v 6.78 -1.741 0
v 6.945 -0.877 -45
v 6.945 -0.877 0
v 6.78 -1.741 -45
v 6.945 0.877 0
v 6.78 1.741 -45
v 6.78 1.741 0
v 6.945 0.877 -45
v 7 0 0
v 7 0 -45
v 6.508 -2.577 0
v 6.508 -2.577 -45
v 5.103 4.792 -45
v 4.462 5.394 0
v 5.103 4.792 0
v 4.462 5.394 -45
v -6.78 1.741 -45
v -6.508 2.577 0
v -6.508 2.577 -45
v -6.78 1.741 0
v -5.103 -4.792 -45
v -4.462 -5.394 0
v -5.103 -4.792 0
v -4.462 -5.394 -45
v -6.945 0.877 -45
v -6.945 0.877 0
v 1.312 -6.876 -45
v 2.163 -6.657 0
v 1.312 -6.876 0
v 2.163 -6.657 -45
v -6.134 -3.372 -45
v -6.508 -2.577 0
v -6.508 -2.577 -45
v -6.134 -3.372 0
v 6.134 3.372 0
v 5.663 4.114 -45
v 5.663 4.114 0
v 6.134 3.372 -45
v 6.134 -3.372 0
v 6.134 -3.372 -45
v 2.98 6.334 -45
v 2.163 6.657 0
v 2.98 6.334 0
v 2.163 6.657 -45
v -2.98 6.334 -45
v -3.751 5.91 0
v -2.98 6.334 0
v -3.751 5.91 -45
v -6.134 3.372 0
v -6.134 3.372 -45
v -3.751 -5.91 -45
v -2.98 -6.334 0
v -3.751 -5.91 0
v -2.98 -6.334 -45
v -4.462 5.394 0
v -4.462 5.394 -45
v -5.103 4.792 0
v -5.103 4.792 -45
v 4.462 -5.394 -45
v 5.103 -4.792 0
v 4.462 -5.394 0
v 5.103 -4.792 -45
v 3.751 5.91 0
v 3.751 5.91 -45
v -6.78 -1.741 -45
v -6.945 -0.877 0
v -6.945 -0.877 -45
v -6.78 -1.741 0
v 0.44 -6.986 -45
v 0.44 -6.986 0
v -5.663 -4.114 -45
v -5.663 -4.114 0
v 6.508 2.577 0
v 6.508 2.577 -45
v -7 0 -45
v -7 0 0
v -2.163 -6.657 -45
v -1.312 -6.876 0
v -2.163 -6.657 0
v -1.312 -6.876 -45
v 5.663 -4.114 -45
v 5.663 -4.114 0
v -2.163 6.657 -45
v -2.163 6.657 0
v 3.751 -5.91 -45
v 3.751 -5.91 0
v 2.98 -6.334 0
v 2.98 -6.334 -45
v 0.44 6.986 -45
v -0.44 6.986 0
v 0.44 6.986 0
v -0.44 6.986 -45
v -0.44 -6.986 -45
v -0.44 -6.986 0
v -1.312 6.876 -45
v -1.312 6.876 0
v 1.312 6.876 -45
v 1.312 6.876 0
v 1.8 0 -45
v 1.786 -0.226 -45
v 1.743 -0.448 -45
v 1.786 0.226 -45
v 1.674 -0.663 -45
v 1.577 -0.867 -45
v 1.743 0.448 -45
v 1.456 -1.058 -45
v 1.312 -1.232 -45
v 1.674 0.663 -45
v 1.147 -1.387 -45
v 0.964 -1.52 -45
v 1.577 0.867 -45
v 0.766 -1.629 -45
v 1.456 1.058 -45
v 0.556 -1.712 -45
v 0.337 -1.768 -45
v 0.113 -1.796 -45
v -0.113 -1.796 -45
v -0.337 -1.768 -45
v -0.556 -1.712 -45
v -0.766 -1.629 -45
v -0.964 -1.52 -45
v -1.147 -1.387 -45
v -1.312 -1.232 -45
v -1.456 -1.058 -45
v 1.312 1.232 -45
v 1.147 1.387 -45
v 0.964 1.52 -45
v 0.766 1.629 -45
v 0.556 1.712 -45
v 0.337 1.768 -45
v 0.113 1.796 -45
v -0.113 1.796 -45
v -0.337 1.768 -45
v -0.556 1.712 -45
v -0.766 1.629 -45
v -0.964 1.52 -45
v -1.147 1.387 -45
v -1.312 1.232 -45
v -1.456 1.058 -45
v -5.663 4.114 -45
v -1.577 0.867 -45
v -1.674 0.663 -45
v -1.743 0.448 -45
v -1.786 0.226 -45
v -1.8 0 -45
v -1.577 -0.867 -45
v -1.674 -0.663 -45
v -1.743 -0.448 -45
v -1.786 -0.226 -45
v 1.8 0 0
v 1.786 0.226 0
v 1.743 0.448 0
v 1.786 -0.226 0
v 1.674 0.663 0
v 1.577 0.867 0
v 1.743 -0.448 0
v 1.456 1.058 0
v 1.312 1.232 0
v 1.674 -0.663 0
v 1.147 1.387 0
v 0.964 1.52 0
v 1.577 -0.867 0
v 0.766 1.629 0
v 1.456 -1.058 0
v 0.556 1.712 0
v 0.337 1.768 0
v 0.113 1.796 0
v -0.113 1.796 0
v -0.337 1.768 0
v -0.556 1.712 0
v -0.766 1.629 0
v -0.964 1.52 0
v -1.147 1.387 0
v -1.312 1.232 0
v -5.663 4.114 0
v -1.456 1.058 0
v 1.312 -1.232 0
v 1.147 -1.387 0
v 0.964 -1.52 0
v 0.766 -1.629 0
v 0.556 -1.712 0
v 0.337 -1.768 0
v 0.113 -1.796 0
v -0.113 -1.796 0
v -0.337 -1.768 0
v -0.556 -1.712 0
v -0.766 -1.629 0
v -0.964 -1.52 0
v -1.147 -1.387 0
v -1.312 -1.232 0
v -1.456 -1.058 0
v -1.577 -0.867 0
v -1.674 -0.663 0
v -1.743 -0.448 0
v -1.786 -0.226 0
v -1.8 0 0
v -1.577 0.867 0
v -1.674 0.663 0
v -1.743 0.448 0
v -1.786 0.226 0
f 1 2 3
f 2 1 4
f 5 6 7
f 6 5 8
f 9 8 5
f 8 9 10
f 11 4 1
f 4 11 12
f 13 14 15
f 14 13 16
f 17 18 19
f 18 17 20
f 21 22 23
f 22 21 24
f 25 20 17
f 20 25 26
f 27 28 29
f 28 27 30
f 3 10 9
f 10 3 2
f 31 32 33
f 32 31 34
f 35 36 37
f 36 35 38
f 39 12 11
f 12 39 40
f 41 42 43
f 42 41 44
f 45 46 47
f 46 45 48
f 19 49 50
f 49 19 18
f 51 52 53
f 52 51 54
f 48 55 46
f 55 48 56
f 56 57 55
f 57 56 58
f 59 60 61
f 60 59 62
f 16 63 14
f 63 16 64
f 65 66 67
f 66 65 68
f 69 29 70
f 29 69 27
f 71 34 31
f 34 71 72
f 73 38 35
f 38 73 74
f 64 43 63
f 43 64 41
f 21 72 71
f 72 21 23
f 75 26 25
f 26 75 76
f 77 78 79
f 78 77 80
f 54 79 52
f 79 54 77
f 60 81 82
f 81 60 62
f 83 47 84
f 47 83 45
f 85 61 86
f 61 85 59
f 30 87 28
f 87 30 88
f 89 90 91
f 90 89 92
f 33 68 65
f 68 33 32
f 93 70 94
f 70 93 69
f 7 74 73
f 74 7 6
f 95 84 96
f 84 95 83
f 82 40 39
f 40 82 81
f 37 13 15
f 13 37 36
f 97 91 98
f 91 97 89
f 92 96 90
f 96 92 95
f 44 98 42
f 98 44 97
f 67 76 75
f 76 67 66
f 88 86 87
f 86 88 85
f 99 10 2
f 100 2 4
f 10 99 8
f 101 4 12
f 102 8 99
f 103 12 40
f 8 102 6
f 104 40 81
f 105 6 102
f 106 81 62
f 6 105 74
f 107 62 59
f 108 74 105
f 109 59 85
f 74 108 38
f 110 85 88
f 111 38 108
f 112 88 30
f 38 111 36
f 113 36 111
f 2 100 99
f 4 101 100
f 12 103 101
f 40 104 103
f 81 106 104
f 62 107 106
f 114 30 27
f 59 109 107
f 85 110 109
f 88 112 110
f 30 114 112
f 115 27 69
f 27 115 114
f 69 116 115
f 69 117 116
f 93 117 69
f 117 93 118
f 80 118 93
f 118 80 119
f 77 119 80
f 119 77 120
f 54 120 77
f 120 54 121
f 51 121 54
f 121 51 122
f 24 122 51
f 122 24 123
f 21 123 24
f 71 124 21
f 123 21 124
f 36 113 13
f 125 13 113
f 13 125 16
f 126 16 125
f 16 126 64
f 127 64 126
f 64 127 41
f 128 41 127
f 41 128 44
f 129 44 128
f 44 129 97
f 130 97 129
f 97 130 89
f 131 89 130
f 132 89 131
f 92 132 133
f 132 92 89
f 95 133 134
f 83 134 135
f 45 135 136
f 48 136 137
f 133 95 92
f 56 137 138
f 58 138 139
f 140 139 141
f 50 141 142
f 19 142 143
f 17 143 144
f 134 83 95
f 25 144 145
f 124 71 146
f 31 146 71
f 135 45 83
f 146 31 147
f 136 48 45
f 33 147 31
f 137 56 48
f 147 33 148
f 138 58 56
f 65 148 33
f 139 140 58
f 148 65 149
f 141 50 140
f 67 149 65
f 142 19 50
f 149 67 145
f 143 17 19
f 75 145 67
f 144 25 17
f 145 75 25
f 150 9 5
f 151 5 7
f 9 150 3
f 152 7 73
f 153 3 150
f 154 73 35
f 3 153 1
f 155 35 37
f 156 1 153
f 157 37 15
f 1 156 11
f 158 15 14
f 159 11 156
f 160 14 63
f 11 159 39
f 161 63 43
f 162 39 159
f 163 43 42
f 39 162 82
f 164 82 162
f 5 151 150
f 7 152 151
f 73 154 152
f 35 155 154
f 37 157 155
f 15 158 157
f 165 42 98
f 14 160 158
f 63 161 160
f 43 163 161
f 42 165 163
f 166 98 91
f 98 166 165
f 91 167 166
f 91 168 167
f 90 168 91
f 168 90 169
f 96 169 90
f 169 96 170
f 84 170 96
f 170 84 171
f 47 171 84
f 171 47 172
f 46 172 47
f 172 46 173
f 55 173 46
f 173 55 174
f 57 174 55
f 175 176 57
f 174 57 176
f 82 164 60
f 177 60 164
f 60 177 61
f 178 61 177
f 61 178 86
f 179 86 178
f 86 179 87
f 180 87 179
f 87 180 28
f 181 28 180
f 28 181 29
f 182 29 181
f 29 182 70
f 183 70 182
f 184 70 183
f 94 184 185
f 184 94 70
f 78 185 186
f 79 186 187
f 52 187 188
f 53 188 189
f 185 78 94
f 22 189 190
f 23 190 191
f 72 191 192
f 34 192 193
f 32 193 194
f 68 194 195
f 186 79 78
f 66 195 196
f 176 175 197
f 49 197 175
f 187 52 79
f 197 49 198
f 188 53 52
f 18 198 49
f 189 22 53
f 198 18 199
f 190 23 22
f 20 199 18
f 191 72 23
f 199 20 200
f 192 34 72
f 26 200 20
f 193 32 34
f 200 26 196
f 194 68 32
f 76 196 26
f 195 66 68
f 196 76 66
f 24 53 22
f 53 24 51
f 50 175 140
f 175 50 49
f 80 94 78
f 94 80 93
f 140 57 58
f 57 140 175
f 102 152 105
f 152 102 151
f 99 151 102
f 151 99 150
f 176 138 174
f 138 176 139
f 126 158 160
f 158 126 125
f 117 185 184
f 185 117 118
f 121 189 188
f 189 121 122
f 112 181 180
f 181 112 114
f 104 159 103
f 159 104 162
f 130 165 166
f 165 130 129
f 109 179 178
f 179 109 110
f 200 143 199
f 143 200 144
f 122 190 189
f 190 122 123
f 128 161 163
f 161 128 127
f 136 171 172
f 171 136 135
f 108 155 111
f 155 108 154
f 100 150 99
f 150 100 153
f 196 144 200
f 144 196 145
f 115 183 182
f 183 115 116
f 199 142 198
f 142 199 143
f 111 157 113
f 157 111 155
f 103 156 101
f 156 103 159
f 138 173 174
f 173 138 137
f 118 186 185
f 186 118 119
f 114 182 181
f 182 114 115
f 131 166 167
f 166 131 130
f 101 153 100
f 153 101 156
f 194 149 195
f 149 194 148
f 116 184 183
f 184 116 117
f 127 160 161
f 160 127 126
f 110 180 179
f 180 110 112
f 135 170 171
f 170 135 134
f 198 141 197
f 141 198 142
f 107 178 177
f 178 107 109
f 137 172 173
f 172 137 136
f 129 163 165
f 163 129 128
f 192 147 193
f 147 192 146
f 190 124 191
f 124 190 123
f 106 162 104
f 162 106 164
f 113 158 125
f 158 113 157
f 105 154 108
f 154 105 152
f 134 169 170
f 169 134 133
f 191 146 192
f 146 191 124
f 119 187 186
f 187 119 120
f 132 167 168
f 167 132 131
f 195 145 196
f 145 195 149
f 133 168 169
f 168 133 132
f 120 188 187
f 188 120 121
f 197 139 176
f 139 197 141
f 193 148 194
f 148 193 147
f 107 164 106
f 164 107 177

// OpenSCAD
$fn = 50;


difference() {
	union() {
		translate(v = [0, 0, -45.0000000000]) {
			cylinder(h = 45, r = 7.0000000000);
		}
		cylinder(h = 0, r = 10.0000000000);
	}
	union() {
		#translate(v = [0, 0, -45]) {
			cylinder(h = 45, r = 1.8000000000);
		}
	}
}
